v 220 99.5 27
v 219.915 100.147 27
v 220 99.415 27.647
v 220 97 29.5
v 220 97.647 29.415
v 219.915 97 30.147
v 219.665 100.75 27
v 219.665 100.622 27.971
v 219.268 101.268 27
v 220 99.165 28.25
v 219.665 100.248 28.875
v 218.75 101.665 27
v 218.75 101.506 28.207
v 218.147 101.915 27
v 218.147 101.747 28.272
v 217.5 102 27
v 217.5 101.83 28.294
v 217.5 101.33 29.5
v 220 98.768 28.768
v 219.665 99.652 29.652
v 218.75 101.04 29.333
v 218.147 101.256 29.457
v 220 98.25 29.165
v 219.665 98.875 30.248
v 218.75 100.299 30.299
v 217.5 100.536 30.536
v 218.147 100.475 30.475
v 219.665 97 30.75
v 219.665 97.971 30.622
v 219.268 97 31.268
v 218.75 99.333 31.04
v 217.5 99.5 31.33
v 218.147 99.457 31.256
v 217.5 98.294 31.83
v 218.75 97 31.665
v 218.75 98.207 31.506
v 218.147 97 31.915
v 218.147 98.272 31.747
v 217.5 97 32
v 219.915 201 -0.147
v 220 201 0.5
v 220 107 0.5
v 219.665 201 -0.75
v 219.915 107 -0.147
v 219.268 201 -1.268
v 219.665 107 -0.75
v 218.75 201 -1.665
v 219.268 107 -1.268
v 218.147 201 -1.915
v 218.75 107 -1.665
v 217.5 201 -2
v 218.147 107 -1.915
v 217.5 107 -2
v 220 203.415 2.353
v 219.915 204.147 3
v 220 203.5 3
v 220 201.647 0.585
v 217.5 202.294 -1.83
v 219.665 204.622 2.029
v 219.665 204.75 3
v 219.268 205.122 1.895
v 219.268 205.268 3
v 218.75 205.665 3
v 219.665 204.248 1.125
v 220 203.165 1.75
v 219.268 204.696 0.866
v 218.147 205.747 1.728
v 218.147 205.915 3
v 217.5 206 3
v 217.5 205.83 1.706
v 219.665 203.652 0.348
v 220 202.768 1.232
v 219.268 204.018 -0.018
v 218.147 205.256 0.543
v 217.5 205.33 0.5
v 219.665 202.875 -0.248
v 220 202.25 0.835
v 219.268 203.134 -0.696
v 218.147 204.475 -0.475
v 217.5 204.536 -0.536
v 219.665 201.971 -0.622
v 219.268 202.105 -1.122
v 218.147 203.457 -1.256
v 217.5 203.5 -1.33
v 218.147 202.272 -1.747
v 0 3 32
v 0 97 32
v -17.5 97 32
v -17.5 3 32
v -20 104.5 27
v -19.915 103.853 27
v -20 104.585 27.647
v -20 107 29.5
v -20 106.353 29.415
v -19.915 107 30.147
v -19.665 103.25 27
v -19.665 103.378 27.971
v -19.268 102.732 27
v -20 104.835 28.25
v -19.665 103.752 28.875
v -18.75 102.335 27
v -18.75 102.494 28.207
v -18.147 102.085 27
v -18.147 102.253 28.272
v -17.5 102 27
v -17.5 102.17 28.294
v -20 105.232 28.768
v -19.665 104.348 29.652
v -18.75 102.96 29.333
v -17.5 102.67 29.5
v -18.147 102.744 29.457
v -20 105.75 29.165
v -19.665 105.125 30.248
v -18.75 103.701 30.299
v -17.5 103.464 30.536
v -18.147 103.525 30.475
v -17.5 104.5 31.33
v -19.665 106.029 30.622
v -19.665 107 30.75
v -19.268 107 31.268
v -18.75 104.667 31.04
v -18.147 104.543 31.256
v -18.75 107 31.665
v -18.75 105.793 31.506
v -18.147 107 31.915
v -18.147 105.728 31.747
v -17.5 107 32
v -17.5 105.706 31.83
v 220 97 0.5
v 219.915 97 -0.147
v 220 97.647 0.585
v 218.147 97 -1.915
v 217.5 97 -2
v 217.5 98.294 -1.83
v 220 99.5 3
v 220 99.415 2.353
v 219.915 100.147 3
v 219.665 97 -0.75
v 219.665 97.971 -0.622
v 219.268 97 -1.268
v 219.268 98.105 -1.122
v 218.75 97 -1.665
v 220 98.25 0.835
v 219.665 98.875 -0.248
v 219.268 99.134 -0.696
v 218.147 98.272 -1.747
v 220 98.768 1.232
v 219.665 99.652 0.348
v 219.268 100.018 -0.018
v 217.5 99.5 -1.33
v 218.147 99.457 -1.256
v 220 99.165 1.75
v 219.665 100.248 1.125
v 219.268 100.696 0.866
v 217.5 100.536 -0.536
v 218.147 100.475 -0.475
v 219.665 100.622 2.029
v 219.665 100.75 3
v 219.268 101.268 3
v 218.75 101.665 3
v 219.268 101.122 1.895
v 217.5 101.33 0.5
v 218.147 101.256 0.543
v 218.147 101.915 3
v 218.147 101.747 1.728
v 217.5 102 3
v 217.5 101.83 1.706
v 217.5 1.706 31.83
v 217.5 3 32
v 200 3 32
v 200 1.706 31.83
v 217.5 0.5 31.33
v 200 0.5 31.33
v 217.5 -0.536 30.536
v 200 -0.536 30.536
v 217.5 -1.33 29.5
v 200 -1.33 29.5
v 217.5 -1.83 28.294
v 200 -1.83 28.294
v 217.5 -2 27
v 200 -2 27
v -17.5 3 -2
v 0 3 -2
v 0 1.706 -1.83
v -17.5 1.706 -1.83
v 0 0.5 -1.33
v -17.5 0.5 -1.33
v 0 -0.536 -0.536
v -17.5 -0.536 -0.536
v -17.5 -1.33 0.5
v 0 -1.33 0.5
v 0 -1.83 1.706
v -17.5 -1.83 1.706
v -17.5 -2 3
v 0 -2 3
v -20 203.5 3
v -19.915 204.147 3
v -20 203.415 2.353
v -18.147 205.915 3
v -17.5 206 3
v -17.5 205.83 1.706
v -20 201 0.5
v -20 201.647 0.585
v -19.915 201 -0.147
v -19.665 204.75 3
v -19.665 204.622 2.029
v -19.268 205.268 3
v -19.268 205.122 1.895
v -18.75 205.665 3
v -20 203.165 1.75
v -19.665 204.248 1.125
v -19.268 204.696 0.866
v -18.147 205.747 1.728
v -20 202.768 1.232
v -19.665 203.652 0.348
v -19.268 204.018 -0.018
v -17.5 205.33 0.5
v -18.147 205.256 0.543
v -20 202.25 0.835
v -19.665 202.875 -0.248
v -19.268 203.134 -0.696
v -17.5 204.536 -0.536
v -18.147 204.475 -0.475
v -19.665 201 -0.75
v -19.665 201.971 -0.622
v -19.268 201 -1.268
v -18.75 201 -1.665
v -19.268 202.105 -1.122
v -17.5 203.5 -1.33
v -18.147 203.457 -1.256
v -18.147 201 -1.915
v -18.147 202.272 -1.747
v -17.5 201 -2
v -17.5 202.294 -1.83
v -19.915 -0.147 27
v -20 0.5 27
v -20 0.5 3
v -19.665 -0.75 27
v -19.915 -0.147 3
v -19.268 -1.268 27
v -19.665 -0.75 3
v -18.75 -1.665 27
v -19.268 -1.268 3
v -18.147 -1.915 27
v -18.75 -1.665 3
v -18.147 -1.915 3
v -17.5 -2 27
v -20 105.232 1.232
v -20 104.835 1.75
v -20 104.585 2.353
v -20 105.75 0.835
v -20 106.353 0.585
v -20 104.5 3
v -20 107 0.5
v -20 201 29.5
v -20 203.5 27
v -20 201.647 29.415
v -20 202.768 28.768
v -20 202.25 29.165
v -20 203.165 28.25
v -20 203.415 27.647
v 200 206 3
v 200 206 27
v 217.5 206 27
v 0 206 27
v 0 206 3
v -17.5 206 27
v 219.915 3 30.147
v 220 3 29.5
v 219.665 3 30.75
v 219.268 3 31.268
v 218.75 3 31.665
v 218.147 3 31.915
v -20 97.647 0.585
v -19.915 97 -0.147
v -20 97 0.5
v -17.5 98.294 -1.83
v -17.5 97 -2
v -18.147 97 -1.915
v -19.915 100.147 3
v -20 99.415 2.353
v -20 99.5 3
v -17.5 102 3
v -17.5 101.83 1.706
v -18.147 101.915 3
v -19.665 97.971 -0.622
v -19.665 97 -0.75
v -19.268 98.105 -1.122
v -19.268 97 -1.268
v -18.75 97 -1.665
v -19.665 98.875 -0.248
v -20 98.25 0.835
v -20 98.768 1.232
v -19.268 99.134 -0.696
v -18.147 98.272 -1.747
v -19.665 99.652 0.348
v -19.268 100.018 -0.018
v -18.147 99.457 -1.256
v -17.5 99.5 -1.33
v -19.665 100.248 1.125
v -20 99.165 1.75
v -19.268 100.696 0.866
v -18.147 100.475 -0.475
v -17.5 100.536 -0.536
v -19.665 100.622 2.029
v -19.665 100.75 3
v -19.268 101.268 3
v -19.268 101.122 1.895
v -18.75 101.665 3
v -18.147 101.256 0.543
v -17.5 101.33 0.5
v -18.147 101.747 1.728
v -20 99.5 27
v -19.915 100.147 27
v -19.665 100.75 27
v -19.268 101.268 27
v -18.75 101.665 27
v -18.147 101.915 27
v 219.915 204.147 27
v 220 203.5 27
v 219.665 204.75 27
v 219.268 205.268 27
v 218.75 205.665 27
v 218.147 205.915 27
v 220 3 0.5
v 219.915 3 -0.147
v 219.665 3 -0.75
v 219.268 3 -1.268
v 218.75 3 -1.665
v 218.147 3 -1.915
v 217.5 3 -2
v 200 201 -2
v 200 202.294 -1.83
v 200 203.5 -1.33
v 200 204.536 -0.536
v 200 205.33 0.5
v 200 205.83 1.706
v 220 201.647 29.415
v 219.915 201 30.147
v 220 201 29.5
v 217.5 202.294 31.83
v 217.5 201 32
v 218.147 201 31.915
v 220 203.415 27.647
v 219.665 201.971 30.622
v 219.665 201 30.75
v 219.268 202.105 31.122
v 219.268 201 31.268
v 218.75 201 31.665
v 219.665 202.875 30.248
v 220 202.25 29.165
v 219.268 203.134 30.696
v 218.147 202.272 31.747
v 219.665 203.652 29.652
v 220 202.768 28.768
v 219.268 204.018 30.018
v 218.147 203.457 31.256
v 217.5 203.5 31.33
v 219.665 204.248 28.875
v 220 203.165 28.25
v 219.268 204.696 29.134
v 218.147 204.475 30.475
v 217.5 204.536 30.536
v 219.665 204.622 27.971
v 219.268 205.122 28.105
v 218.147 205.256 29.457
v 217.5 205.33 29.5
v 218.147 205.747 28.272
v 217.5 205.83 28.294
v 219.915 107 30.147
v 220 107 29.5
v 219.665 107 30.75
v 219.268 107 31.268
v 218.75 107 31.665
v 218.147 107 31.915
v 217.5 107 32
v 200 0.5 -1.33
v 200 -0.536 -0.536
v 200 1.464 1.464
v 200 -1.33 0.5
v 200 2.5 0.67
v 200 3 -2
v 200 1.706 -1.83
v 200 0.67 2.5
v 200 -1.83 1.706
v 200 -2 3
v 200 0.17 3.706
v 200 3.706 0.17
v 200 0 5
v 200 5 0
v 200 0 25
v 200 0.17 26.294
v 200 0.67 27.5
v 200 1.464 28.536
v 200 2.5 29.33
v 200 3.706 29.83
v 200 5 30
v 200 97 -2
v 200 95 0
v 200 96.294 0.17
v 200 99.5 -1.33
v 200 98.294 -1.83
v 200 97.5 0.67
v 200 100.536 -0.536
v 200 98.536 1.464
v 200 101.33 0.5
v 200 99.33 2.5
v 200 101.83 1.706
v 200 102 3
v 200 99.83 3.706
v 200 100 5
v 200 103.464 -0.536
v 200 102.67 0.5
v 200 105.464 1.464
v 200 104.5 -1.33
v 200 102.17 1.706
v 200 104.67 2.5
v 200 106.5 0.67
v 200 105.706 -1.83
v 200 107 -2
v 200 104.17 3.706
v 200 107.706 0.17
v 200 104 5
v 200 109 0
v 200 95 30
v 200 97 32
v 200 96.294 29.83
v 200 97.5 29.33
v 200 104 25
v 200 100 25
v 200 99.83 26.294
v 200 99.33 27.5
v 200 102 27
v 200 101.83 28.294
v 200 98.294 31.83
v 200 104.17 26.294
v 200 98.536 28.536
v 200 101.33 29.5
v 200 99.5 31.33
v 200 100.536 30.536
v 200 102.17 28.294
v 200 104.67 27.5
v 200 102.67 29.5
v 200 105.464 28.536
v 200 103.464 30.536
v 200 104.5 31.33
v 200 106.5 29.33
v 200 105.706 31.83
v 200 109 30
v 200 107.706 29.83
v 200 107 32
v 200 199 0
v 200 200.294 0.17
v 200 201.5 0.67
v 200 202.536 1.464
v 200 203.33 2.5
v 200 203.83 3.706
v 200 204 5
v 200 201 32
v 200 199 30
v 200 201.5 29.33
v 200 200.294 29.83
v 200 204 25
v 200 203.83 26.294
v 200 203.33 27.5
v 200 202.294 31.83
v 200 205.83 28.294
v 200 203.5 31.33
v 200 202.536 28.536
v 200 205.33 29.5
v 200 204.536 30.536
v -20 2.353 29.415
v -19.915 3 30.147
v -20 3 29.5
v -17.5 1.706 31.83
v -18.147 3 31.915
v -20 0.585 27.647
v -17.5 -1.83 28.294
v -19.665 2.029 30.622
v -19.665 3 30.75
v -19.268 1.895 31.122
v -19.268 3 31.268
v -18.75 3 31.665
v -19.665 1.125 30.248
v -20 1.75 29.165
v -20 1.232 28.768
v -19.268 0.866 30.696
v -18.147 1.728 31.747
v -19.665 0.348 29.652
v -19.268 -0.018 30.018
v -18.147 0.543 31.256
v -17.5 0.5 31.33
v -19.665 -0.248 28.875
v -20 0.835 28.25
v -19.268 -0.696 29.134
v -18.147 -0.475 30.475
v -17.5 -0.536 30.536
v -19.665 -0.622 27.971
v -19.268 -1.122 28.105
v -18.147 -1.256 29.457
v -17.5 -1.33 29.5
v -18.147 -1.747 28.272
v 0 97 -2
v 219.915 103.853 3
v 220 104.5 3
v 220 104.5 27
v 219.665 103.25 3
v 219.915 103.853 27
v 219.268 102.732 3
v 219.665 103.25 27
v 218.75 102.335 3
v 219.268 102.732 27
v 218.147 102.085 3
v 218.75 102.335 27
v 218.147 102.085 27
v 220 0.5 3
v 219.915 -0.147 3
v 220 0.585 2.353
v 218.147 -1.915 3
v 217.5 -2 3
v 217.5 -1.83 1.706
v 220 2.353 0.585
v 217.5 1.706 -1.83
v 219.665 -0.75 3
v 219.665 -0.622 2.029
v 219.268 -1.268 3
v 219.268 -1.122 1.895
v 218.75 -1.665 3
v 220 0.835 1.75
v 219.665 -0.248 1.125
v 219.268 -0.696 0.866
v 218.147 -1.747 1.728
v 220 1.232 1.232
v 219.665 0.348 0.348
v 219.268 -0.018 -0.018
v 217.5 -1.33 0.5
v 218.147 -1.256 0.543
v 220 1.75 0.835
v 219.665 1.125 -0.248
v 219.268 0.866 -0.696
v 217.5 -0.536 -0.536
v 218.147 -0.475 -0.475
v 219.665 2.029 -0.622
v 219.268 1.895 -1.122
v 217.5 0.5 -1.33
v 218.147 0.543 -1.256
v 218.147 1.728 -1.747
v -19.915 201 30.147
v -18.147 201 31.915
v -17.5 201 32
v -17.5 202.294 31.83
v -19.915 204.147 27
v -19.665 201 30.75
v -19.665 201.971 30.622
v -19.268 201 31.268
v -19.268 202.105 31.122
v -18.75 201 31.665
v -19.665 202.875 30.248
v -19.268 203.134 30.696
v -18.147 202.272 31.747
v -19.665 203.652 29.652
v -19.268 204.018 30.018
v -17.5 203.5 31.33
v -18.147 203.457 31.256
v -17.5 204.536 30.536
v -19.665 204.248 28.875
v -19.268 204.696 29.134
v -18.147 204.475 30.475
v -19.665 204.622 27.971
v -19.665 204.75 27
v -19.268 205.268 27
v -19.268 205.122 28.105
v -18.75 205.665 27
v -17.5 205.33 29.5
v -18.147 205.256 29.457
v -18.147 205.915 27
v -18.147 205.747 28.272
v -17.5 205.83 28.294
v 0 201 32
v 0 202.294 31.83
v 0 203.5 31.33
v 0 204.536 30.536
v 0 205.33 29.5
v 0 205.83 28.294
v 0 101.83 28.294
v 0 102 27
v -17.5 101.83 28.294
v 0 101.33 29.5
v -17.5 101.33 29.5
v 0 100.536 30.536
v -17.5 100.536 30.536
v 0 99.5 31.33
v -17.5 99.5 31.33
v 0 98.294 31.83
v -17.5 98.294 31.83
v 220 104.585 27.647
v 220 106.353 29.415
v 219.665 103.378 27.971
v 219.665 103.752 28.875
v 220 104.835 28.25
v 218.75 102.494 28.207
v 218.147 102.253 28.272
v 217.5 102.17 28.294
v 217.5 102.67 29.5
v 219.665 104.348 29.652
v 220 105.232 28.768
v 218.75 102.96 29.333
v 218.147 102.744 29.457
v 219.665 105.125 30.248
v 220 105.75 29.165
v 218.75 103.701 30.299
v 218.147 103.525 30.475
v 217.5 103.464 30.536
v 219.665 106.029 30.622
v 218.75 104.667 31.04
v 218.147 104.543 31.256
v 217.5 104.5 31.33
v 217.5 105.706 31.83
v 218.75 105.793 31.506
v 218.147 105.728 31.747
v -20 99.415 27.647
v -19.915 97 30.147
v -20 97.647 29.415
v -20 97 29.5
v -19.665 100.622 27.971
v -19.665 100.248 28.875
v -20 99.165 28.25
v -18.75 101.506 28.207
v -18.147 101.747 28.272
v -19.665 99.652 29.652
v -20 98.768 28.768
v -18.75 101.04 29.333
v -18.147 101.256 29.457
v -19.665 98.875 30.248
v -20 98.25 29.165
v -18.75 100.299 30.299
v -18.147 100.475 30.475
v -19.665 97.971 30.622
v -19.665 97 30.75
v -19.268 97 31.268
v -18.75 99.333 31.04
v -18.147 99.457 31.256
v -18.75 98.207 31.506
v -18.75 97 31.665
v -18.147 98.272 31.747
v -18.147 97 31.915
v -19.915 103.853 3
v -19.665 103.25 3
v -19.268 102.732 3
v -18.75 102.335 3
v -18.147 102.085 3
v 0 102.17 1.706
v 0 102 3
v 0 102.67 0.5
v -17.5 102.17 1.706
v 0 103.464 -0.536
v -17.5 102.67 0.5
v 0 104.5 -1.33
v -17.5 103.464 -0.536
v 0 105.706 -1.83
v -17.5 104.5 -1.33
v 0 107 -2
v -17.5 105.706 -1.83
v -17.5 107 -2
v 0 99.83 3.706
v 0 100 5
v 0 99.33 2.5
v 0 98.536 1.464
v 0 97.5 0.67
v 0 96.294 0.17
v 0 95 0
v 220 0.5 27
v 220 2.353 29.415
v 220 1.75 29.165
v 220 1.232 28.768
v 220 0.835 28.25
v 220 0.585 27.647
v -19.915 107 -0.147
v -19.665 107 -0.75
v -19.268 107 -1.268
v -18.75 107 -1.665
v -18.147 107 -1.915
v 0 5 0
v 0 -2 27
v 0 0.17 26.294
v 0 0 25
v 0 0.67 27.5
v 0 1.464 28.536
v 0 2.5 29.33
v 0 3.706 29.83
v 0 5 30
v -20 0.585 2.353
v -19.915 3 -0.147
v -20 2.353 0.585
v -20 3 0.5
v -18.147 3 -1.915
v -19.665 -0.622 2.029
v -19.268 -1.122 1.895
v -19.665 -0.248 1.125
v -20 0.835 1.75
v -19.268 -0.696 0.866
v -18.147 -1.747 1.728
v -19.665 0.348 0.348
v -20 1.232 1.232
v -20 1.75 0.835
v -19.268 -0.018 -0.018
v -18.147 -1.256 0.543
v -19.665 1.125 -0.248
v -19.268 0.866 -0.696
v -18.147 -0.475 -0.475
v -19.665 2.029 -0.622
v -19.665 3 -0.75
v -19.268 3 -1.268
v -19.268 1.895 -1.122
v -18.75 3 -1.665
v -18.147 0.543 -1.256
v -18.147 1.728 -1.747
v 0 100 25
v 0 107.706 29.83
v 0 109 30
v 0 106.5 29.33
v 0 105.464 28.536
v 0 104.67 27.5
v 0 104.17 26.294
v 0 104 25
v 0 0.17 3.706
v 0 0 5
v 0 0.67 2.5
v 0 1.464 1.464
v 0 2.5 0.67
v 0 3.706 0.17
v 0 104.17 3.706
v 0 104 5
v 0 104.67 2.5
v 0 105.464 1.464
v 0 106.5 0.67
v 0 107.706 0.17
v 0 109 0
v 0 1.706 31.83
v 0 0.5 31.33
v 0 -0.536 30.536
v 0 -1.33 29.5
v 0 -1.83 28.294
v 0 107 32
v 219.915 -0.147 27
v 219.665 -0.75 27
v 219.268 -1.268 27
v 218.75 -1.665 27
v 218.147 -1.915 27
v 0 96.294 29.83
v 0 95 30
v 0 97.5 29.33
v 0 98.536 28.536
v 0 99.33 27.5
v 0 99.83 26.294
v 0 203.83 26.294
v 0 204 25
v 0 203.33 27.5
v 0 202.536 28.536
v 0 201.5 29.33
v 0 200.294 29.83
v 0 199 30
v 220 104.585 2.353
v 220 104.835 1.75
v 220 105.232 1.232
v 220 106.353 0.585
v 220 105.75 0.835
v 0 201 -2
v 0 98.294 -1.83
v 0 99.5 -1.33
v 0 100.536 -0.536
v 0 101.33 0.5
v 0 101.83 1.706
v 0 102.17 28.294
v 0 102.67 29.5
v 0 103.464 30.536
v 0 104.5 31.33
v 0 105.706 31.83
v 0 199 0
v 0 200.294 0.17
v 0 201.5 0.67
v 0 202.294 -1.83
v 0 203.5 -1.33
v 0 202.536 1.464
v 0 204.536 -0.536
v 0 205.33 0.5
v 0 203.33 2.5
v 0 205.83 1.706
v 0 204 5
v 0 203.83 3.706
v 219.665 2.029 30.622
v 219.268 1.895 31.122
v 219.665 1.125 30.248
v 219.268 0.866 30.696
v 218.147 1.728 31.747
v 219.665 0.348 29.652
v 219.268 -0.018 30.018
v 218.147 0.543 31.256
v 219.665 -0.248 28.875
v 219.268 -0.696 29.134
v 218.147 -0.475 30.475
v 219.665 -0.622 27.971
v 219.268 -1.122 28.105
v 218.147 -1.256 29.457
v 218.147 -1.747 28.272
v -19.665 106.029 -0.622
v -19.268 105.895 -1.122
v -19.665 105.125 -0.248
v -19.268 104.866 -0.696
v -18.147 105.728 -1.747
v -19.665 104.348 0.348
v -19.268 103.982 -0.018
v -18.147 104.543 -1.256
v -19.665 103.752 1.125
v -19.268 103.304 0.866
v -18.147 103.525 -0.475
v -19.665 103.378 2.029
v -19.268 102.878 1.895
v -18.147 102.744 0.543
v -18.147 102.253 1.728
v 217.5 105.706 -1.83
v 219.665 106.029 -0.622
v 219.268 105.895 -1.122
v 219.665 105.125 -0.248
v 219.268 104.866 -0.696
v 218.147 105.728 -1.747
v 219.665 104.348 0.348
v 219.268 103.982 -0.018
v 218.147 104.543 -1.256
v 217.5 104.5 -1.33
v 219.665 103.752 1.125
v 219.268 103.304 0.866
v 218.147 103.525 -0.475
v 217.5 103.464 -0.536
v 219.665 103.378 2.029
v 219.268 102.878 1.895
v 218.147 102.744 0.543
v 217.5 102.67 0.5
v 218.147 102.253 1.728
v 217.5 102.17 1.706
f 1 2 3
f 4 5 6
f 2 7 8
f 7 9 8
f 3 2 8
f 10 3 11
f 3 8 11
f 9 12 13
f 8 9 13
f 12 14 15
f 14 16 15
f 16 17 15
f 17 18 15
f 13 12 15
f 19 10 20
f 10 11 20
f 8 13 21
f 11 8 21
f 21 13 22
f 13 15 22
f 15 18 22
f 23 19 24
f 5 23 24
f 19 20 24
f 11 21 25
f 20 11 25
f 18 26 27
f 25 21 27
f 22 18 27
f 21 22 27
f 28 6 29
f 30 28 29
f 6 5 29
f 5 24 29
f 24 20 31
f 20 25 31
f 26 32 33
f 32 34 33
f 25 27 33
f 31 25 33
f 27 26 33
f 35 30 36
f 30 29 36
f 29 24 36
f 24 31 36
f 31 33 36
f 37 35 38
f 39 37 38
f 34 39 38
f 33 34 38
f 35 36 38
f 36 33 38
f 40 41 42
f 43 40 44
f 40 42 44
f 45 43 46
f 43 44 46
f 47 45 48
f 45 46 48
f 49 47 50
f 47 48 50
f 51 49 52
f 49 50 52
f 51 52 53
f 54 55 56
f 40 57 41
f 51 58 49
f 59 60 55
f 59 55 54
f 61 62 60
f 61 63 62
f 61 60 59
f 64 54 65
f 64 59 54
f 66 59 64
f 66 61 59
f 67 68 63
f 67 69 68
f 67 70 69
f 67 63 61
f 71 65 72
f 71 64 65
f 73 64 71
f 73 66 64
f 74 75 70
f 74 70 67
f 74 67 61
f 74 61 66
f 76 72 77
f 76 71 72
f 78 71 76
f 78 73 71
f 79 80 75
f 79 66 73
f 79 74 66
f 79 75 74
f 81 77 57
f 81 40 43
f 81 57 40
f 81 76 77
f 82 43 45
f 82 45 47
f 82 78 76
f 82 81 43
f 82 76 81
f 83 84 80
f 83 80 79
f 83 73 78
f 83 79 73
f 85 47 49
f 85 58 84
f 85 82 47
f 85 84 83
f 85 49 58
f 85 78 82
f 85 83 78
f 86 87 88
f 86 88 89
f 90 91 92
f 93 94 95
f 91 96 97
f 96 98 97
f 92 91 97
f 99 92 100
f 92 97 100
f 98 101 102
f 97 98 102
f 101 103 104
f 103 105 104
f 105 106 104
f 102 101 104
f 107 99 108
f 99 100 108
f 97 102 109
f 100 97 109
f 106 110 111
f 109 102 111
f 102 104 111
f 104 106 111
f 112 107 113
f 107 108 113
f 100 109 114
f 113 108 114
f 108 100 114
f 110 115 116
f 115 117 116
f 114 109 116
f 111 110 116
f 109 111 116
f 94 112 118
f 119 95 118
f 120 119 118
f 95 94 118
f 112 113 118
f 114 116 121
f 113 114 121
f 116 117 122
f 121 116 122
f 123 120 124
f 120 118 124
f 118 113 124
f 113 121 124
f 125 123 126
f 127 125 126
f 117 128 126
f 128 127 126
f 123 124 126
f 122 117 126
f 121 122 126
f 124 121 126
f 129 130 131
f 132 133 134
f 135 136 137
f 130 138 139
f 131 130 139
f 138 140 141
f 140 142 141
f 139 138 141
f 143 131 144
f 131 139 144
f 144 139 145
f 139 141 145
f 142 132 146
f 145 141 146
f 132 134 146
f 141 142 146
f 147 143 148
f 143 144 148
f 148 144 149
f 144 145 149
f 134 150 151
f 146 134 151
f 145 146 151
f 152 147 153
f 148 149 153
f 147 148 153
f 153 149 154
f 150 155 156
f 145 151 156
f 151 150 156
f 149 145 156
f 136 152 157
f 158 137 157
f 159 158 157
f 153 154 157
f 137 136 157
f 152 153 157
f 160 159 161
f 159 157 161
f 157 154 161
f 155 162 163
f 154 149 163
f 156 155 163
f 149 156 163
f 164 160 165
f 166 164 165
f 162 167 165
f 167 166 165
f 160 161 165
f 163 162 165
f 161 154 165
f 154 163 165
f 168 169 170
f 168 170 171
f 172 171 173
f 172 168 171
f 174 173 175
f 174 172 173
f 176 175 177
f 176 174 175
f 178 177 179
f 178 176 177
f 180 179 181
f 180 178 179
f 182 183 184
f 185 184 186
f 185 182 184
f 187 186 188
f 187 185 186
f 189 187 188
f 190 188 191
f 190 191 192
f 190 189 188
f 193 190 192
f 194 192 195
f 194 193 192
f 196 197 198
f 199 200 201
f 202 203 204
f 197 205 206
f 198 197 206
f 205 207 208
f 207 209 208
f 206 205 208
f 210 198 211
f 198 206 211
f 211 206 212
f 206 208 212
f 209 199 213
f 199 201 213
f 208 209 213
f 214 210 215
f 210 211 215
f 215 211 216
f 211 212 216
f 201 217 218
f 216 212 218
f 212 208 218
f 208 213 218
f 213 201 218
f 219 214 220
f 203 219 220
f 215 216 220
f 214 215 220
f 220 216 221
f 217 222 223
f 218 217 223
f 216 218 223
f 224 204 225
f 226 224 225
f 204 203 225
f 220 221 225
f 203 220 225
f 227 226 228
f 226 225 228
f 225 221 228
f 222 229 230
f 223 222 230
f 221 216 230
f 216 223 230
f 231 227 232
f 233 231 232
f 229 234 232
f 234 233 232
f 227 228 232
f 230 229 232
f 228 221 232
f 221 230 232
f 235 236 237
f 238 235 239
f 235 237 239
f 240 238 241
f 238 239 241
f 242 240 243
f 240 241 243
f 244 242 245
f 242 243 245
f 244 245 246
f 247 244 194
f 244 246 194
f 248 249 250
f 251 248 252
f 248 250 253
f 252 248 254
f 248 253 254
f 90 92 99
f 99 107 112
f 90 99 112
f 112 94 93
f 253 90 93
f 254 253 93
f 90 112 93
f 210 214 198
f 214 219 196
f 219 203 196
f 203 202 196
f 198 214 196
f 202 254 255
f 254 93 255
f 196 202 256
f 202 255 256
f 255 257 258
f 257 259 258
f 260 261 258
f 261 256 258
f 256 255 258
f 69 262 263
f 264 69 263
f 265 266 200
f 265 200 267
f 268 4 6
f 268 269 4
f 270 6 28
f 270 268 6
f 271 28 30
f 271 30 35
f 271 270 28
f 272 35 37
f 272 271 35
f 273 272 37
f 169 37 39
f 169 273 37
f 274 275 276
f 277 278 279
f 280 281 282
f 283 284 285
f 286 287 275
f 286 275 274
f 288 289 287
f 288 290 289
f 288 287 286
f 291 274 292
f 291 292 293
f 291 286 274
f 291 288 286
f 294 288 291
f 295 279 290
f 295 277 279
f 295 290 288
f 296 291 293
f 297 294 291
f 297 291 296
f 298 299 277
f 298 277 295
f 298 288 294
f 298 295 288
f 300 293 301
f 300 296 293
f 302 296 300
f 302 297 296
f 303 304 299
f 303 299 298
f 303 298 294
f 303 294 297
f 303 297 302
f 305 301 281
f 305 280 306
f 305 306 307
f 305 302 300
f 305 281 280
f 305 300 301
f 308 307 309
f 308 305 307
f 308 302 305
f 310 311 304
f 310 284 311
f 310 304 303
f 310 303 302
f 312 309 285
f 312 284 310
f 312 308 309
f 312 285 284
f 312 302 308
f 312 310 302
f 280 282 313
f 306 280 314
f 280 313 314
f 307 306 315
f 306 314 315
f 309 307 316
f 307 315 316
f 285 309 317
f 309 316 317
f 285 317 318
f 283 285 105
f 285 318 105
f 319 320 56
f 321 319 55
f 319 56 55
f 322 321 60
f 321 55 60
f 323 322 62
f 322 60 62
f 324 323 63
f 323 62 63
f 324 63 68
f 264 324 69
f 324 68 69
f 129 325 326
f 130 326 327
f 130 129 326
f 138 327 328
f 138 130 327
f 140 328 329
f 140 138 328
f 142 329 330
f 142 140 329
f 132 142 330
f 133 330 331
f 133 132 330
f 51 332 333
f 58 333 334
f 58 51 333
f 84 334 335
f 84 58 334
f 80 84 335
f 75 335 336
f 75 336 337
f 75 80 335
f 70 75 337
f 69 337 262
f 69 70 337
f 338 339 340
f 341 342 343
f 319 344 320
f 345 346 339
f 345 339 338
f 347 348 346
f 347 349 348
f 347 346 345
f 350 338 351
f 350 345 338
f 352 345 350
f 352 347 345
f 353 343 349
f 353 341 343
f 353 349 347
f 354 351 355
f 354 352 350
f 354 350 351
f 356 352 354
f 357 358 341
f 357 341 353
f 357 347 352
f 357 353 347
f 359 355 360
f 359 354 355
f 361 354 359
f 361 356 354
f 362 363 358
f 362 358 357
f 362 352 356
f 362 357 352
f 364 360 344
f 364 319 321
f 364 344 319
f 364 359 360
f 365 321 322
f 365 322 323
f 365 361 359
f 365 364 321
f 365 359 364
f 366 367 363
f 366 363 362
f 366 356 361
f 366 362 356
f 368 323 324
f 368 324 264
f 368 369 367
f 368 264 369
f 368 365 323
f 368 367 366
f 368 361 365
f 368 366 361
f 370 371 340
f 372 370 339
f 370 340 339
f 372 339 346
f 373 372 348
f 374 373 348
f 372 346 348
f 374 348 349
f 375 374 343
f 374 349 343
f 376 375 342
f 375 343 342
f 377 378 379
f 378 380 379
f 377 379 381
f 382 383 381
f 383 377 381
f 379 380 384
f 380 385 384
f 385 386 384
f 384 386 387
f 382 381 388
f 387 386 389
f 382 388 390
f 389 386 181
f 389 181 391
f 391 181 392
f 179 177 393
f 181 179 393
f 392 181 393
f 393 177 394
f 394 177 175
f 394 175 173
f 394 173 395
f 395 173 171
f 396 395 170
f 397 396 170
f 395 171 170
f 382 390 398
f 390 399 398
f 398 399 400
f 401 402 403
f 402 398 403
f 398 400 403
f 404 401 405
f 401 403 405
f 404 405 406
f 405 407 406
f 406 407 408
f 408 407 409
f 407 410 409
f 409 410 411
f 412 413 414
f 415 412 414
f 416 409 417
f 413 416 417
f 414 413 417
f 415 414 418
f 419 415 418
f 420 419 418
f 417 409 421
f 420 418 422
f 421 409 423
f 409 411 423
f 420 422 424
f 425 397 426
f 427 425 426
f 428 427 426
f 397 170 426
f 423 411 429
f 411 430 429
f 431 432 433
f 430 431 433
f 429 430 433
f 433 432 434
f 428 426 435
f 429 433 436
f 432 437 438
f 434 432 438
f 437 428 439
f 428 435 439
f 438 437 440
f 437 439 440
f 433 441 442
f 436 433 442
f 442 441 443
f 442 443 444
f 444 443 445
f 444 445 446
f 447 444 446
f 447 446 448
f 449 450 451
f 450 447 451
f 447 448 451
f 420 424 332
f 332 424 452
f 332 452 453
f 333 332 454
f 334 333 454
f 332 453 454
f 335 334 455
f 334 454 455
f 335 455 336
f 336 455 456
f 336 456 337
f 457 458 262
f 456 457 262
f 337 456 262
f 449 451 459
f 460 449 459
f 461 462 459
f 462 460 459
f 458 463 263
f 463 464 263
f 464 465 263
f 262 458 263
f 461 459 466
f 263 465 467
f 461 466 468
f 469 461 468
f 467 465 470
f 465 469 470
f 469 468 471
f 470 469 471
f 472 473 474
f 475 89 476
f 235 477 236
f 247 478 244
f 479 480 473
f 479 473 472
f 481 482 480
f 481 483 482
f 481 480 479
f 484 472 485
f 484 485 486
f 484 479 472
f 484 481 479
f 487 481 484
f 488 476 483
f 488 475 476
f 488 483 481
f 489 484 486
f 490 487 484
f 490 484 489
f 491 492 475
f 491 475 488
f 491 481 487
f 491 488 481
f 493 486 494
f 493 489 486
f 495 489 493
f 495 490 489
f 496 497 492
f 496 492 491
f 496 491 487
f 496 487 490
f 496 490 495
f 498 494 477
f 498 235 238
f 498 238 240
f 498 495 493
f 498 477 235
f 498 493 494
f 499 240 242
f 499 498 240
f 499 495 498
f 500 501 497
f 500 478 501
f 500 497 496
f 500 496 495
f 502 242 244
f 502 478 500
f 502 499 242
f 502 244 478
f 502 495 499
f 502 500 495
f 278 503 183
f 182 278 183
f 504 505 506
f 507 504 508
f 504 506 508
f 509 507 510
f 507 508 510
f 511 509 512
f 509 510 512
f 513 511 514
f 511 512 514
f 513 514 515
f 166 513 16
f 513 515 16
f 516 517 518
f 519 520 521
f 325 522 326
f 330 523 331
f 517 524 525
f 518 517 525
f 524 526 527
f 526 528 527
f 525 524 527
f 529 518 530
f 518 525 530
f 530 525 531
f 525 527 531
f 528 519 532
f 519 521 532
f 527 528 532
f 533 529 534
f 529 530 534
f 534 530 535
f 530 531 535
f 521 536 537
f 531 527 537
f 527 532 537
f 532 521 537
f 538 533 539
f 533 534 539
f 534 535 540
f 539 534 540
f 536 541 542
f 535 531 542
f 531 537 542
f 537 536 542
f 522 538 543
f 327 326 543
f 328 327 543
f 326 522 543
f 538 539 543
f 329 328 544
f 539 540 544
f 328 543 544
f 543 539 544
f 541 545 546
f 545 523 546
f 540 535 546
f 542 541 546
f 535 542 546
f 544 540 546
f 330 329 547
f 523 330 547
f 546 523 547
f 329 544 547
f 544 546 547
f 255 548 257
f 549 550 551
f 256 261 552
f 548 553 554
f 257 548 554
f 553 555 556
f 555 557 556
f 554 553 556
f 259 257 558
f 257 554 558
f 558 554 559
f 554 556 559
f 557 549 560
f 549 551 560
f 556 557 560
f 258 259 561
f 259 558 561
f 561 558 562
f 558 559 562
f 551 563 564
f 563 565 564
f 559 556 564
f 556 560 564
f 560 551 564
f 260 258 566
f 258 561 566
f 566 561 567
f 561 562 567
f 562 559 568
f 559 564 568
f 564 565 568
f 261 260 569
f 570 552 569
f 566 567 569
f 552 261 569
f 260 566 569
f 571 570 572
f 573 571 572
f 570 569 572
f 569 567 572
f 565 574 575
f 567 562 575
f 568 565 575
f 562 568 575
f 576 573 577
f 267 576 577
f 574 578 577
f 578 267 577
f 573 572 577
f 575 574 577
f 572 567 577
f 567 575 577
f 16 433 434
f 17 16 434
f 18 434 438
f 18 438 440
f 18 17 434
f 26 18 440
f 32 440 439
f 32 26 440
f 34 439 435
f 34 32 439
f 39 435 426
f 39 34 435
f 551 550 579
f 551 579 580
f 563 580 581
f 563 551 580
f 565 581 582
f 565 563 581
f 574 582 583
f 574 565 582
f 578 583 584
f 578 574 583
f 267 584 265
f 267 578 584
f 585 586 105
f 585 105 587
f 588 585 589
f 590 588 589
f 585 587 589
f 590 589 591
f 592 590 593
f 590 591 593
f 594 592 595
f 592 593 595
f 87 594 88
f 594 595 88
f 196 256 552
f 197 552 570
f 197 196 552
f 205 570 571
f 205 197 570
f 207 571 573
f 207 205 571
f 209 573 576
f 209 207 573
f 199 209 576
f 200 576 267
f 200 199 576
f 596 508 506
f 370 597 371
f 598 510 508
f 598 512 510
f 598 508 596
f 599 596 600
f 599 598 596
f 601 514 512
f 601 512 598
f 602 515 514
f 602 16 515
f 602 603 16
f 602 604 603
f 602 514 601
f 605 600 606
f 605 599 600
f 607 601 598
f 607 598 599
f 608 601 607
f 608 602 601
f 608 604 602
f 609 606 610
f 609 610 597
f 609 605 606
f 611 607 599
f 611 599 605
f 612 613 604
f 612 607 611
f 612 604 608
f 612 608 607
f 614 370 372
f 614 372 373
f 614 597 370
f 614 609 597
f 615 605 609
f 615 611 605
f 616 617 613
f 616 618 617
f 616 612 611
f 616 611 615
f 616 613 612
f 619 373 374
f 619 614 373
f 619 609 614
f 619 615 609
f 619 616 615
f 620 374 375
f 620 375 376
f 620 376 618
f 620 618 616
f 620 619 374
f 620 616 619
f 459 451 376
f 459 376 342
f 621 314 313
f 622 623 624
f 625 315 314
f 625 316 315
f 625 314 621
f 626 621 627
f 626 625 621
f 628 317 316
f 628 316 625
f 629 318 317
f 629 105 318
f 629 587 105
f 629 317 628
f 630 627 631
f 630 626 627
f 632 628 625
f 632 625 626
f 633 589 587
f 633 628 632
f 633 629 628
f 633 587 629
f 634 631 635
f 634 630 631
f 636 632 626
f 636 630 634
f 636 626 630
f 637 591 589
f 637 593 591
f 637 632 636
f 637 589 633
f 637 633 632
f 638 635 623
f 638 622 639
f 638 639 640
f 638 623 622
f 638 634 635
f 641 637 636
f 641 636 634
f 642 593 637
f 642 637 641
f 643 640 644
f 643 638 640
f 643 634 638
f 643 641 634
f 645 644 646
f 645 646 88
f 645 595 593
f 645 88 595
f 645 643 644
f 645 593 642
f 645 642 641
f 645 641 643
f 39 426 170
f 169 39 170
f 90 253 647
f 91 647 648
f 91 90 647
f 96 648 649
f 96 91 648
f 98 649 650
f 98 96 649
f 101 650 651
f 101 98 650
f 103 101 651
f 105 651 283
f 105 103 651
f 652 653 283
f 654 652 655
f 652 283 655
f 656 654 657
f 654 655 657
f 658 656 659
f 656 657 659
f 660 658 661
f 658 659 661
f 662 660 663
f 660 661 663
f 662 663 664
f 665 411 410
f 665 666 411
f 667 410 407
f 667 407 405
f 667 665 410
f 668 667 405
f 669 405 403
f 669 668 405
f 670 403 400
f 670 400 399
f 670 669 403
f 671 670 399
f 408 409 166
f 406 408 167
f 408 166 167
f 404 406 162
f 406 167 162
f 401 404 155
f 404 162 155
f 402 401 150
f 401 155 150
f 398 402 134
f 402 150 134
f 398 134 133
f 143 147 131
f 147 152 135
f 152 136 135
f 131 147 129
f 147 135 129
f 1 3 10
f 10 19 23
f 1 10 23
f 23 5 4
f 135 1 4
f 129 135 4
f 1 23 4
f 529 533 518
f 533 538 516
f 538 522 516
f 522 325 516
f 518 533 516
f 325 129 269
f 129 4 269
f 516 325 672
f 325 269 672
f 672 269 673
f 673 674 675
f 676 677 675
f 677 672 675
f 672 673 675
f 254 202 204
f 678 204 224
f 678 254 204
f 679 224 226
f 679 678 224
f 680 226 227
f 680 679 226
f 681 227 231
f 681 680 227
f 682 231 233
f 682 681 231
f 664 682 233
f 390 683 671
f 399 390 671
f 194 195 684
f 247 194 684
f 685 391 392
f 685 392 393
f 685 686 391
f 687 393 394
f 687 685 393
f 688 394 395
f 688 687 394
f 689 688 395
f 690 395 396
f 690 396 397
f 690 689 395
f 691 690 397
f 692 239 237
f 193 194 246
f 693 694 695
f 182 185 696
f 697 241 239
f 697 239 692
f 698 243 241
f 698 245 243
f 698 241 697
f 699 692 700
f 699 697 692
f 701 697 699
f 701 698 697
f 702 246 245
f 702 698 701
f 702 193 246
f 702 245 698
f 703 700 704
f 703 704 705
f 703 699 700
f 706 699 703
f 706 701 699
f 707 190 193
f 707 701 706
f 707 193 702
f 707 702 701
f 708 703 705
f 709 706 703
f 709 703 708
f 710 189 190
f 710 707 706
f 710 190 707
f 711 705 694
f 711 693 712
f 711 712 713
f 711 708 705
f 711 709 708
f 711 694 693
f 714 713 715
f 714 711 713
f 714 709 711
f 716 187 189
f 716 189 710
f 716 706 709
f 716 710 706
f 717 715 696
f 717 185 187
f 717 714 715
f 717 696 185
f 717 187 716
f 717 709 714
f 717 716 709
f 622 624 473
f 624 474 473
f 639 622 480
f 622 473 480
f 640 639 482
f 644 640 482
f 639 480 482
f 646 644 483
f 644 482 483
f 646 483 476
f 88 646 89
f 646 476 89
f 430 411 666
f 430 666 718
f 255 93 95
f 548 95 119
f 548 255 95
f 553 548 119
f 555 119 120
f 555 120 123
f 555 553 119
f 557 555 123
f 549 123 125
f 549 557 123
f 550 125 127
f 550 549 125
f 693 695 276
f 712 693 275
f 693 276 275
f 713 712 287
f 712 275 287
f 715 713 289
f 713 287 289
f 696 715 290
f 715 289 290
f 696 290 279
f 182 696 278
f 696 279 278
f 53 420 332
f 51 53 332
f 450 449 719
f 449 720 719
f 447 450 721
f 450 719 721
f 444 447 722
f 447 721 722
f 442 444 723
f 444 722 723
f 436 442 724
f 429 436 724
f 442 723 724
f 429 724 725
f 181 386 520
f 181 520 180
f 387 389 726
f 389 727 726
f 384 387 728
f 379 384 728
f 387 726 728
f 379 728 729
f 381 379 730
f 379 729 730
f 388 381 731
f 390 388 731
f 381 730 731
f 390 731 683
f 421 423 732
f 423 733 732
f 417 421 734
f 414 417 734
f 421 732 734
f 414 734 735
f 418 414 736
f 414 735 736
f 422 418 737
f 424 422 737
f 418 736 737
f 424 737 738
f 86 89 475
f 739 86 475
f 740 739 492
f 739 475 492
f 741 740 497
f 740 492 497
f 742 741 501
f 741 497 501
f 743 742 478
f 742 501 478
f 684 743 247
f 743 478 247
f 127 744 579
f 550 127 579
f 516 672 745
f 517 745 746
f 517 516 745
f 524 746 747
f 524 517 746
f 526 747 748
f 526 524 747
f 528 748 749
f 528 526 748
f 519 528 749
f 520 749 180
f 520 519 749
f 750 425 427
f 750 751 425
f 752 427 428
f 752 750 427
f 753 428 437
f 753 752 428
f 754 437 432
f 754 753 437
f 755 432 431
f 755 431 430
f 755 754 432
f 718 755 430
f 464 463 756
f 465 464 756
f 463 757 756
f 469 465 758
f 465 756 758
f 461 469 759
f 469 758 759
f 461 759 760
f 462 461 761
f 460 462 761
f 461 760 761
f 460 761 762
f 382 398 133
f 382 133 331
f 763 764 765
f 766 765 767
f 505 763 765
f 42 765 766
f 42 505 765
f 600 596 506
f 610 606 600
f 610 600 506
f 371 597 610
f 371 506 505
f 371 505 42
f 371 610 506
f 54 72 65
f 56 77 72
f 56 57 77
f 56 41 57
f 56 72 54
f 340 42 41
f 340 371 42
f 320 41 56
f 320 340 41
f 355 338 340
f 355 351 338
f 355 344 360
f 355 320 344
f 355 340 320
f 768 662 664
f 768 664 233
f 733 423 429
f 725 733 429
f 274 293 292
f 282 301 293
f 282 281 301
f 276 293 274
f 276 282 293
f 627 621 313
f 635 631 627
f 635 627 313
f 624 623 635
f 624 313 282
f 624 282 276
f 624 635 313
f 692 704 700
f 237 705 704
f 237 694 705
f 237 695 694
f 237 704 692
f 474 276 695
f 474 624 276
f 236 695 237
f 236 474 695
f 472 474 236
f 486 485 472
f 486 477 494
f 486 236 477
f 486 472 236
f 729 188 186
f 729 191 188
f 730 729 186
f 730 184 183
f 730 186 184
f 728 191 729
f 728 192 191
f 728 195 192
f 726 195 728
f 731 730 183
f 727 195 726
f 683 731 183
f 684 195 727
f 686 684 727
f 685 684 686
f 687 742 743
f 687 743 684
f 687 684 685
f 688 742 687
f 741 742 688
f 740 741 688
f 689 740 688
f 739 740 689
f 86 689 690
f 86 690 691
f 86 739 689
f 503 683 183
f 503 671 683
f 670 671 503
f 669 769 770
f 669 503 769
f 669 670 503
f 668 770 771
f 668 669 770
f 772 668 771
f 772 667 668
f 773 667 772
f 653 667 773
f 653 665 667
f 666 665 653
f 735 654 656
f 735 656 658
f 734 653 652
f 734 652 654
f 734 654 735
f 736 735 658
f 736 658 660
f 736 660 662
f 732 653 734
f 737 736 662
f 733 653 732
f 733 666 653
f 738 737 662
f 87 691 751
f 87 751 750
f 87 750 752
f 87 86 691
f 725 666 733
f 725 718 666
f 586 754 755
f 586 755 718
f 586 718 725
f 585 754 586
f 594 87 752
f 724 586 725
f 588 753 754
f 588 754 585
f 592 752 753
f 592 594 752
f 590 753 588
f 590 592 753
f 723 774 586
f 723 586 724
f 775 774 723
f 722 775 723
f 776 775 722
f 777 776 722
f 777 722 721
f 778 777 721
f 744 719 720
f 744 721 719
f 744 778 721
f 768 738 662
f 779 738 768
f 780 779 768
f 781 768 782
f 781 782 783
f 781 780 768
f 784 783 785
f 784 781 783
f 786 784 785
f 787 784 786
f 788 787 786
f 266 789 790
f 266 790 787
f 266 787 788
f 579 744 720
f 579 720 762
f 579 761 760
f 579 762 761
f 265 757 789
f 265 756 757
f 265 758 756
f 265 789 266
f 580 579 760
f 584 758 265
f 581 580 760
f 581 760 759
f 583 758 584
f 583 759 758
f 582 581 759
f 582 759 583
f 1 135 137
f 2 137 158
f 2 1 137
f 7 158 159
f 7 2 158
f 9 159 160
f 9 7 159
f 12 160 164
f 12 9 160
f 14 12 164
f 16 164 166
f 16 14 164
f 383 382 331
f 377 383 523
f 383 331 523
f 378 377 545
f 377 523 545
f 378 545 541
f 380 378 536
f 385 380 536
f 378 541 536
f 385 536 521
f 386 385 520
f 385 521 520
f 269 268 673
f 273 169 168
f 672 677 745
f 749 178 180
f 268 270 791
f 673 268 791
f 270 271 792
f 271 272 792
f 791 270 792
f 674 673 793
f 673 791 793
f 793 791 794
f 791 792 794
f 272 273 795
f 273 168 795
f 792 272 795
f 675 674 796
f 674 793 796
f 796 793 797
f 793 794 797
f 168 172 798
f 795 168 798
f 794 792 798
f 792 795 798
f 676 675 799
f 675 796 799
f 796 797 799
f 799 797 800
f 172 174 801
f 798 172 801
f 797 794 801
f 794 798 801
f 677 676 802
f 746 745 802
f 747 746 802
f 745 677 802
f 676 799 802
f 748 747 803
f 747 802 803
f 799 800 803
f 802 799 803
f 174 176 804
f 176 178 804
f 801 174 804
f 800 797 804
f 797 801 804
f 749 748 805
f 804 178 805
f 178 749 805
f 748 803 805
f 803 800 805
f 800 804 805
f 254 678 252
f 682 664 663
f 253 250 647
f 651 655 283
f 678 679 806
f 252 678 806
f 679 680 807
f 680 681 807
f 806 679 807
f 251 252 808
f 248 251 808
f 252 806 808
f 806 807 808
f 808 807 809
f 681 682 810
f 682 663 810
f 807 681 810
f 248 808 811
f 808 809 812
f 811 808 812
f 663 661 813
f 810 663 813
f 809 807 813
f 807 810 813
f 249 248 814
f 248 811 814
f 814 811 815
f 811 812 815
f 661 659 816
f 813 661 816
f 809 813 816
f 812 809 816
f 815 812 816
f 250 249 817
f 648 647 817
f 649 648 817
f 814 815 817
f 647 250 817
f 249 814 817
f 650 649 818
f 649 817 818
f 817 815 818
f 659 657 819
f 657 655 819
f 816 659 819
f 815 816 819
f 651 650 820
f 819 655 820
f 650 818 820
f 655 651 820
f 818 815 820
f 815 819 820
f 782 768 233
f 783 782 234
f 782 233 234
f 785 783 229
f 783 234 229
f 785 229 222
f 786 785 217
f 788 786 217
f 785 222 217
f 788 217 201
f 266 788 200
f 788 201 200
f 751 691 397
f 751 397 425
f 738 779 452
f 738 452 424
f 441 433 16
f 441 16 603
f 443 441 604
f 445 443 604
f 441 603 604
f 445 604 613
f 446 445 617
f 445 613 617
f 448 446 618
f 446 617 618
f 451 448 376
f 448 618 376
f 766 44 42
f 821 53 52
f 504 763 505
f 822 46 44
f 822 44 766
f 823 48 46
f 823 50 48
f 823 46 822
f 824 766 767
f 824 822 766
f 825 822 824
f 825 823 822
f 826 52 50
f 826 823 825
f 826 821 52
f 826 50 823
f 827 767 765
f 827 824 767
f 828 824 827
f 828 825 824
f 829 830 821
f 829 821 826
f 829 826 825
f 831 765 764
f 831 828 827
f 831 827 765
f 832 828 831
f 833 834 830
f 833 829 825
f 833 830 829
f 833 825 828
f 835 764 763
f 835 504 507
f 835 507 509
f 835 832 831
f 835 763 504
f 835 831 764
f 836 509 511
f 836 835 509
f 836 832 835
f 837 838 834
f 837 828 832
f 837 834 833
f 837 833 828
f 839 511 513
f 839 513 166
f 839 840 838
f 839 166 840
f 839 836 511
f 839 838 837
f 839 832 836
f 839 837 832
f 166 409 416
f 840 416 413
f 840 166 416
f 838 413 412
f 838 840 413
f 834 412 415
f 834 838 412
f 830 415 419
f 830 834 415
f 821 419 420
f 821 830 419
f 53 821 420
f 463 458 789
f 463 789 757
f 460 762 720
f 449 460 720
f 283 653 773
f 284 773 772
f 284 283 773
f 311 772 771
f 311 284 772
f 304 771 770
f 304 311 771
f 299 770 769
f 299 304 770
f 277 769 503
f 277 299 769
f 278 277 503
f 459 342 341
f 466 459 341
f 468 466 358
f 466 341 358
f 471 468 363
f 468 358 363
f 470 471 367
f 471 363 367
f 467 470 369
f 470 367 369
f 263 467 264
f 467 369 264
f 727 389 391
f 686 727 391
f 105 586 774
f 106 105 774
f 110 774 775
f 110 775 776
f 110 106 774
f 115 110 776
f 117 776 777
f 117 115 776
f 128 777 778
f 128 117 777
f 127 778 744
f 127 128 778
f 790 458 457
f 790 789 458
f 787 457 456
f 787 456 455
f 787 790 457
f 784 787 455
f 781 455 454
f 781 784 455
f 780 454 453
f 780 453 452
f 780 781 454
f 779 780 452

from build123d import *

# Parameters (mm, degrees)
F0_W     = 100
F0_H     = 30
F1_DEPTH = 100
F2_W     = 104
F2_H     = 34
F2_W_2   = 100
F2_H_2   = 30
F3_DEPTH = 20
F4_R     = 5
F6_R     = 2.5


with BuildPart() as f1:
    # F0 (on Right) → F1 (new body)
    with BuildSketch(Plane.YZ):
        with Locations((50, 15)):
            Rectangle(F0_W, F0_H)
    extrude(amount=F1_DEPTH)

    # F2 (on face) → F3 (join)
    with BuildSketch(Plane(origin=(0, 0, 0), x_dir=(0, -1, 0), z_dir=(-1, 0, 0))):
        with Locations((-50, 15)):
            Rectangle(F2_W, F2_H)
        with Locations((-50, 15)):
            Rectangle(F2_W_2, F2_H_2, mode=Mode.SUBTRACT)
        with Locations((-50, 15)):
            Rectangle(F2_W_2, F2_H_2)
    extrude(amount=F3_DEPTH)

    # F4
    f4_edges = [f1.edges().sort_by_distance(p)[0] for p in [
        (50, 0, 30),
        (50, 0, 0),
        (50, 100, 30),
        (50, 100, 0),
        (-10, 102, 32),
        (-10, 102, -2),
        (-10, -2, 32),
        (-10, -2, -2),
    ]]
    fillet(f4_edges, radius=F4_R)

    # F5: F1 across face


with BuildPart() as f1_1:
    add(f1.part)
    add(f1.part.mirror(Plane(origin=(100, 50, 15), x_dir=(0, 1, 0), z_dir=(1, 0, 0))))

    # F6
    f6_edges = [f1_1.edges().sort_by_distance(p)[0] for p in [
        (-20, 50, 32),
        (-20, -0.535534, 30.535534),
        (-20, 100.535534, 30.535534),
        (-20, -2, 15),
        (-20, 102, 15),
        (-20, -0.535534, -0.535534),
        (-20, 100.535534, -0.535534),
        (-20, 50, -2),
        (220, 50, 32),
        (220, -0.535534, 30.535534),
        (220, 100.535534, 30.535534),
        (220, -2, 15),
        (220, 102, 15),
        (220, -0.535534, -0.535534),
        (220, 100.535534, -0.535534),
        (220, 50, -2),
    ]]
    fillet(f6_edges, radius=F6_R)

    # F7: F1 across face


with BuildPart() as f1_2:
    add(f1_1.part)
    add(f1_1.part.mirror(Plane(origin=(-8.75, 102, 15), x_dir=(-1, 0, 0), z_dir=(0, 1, 0))))


solid = f1_2.part
